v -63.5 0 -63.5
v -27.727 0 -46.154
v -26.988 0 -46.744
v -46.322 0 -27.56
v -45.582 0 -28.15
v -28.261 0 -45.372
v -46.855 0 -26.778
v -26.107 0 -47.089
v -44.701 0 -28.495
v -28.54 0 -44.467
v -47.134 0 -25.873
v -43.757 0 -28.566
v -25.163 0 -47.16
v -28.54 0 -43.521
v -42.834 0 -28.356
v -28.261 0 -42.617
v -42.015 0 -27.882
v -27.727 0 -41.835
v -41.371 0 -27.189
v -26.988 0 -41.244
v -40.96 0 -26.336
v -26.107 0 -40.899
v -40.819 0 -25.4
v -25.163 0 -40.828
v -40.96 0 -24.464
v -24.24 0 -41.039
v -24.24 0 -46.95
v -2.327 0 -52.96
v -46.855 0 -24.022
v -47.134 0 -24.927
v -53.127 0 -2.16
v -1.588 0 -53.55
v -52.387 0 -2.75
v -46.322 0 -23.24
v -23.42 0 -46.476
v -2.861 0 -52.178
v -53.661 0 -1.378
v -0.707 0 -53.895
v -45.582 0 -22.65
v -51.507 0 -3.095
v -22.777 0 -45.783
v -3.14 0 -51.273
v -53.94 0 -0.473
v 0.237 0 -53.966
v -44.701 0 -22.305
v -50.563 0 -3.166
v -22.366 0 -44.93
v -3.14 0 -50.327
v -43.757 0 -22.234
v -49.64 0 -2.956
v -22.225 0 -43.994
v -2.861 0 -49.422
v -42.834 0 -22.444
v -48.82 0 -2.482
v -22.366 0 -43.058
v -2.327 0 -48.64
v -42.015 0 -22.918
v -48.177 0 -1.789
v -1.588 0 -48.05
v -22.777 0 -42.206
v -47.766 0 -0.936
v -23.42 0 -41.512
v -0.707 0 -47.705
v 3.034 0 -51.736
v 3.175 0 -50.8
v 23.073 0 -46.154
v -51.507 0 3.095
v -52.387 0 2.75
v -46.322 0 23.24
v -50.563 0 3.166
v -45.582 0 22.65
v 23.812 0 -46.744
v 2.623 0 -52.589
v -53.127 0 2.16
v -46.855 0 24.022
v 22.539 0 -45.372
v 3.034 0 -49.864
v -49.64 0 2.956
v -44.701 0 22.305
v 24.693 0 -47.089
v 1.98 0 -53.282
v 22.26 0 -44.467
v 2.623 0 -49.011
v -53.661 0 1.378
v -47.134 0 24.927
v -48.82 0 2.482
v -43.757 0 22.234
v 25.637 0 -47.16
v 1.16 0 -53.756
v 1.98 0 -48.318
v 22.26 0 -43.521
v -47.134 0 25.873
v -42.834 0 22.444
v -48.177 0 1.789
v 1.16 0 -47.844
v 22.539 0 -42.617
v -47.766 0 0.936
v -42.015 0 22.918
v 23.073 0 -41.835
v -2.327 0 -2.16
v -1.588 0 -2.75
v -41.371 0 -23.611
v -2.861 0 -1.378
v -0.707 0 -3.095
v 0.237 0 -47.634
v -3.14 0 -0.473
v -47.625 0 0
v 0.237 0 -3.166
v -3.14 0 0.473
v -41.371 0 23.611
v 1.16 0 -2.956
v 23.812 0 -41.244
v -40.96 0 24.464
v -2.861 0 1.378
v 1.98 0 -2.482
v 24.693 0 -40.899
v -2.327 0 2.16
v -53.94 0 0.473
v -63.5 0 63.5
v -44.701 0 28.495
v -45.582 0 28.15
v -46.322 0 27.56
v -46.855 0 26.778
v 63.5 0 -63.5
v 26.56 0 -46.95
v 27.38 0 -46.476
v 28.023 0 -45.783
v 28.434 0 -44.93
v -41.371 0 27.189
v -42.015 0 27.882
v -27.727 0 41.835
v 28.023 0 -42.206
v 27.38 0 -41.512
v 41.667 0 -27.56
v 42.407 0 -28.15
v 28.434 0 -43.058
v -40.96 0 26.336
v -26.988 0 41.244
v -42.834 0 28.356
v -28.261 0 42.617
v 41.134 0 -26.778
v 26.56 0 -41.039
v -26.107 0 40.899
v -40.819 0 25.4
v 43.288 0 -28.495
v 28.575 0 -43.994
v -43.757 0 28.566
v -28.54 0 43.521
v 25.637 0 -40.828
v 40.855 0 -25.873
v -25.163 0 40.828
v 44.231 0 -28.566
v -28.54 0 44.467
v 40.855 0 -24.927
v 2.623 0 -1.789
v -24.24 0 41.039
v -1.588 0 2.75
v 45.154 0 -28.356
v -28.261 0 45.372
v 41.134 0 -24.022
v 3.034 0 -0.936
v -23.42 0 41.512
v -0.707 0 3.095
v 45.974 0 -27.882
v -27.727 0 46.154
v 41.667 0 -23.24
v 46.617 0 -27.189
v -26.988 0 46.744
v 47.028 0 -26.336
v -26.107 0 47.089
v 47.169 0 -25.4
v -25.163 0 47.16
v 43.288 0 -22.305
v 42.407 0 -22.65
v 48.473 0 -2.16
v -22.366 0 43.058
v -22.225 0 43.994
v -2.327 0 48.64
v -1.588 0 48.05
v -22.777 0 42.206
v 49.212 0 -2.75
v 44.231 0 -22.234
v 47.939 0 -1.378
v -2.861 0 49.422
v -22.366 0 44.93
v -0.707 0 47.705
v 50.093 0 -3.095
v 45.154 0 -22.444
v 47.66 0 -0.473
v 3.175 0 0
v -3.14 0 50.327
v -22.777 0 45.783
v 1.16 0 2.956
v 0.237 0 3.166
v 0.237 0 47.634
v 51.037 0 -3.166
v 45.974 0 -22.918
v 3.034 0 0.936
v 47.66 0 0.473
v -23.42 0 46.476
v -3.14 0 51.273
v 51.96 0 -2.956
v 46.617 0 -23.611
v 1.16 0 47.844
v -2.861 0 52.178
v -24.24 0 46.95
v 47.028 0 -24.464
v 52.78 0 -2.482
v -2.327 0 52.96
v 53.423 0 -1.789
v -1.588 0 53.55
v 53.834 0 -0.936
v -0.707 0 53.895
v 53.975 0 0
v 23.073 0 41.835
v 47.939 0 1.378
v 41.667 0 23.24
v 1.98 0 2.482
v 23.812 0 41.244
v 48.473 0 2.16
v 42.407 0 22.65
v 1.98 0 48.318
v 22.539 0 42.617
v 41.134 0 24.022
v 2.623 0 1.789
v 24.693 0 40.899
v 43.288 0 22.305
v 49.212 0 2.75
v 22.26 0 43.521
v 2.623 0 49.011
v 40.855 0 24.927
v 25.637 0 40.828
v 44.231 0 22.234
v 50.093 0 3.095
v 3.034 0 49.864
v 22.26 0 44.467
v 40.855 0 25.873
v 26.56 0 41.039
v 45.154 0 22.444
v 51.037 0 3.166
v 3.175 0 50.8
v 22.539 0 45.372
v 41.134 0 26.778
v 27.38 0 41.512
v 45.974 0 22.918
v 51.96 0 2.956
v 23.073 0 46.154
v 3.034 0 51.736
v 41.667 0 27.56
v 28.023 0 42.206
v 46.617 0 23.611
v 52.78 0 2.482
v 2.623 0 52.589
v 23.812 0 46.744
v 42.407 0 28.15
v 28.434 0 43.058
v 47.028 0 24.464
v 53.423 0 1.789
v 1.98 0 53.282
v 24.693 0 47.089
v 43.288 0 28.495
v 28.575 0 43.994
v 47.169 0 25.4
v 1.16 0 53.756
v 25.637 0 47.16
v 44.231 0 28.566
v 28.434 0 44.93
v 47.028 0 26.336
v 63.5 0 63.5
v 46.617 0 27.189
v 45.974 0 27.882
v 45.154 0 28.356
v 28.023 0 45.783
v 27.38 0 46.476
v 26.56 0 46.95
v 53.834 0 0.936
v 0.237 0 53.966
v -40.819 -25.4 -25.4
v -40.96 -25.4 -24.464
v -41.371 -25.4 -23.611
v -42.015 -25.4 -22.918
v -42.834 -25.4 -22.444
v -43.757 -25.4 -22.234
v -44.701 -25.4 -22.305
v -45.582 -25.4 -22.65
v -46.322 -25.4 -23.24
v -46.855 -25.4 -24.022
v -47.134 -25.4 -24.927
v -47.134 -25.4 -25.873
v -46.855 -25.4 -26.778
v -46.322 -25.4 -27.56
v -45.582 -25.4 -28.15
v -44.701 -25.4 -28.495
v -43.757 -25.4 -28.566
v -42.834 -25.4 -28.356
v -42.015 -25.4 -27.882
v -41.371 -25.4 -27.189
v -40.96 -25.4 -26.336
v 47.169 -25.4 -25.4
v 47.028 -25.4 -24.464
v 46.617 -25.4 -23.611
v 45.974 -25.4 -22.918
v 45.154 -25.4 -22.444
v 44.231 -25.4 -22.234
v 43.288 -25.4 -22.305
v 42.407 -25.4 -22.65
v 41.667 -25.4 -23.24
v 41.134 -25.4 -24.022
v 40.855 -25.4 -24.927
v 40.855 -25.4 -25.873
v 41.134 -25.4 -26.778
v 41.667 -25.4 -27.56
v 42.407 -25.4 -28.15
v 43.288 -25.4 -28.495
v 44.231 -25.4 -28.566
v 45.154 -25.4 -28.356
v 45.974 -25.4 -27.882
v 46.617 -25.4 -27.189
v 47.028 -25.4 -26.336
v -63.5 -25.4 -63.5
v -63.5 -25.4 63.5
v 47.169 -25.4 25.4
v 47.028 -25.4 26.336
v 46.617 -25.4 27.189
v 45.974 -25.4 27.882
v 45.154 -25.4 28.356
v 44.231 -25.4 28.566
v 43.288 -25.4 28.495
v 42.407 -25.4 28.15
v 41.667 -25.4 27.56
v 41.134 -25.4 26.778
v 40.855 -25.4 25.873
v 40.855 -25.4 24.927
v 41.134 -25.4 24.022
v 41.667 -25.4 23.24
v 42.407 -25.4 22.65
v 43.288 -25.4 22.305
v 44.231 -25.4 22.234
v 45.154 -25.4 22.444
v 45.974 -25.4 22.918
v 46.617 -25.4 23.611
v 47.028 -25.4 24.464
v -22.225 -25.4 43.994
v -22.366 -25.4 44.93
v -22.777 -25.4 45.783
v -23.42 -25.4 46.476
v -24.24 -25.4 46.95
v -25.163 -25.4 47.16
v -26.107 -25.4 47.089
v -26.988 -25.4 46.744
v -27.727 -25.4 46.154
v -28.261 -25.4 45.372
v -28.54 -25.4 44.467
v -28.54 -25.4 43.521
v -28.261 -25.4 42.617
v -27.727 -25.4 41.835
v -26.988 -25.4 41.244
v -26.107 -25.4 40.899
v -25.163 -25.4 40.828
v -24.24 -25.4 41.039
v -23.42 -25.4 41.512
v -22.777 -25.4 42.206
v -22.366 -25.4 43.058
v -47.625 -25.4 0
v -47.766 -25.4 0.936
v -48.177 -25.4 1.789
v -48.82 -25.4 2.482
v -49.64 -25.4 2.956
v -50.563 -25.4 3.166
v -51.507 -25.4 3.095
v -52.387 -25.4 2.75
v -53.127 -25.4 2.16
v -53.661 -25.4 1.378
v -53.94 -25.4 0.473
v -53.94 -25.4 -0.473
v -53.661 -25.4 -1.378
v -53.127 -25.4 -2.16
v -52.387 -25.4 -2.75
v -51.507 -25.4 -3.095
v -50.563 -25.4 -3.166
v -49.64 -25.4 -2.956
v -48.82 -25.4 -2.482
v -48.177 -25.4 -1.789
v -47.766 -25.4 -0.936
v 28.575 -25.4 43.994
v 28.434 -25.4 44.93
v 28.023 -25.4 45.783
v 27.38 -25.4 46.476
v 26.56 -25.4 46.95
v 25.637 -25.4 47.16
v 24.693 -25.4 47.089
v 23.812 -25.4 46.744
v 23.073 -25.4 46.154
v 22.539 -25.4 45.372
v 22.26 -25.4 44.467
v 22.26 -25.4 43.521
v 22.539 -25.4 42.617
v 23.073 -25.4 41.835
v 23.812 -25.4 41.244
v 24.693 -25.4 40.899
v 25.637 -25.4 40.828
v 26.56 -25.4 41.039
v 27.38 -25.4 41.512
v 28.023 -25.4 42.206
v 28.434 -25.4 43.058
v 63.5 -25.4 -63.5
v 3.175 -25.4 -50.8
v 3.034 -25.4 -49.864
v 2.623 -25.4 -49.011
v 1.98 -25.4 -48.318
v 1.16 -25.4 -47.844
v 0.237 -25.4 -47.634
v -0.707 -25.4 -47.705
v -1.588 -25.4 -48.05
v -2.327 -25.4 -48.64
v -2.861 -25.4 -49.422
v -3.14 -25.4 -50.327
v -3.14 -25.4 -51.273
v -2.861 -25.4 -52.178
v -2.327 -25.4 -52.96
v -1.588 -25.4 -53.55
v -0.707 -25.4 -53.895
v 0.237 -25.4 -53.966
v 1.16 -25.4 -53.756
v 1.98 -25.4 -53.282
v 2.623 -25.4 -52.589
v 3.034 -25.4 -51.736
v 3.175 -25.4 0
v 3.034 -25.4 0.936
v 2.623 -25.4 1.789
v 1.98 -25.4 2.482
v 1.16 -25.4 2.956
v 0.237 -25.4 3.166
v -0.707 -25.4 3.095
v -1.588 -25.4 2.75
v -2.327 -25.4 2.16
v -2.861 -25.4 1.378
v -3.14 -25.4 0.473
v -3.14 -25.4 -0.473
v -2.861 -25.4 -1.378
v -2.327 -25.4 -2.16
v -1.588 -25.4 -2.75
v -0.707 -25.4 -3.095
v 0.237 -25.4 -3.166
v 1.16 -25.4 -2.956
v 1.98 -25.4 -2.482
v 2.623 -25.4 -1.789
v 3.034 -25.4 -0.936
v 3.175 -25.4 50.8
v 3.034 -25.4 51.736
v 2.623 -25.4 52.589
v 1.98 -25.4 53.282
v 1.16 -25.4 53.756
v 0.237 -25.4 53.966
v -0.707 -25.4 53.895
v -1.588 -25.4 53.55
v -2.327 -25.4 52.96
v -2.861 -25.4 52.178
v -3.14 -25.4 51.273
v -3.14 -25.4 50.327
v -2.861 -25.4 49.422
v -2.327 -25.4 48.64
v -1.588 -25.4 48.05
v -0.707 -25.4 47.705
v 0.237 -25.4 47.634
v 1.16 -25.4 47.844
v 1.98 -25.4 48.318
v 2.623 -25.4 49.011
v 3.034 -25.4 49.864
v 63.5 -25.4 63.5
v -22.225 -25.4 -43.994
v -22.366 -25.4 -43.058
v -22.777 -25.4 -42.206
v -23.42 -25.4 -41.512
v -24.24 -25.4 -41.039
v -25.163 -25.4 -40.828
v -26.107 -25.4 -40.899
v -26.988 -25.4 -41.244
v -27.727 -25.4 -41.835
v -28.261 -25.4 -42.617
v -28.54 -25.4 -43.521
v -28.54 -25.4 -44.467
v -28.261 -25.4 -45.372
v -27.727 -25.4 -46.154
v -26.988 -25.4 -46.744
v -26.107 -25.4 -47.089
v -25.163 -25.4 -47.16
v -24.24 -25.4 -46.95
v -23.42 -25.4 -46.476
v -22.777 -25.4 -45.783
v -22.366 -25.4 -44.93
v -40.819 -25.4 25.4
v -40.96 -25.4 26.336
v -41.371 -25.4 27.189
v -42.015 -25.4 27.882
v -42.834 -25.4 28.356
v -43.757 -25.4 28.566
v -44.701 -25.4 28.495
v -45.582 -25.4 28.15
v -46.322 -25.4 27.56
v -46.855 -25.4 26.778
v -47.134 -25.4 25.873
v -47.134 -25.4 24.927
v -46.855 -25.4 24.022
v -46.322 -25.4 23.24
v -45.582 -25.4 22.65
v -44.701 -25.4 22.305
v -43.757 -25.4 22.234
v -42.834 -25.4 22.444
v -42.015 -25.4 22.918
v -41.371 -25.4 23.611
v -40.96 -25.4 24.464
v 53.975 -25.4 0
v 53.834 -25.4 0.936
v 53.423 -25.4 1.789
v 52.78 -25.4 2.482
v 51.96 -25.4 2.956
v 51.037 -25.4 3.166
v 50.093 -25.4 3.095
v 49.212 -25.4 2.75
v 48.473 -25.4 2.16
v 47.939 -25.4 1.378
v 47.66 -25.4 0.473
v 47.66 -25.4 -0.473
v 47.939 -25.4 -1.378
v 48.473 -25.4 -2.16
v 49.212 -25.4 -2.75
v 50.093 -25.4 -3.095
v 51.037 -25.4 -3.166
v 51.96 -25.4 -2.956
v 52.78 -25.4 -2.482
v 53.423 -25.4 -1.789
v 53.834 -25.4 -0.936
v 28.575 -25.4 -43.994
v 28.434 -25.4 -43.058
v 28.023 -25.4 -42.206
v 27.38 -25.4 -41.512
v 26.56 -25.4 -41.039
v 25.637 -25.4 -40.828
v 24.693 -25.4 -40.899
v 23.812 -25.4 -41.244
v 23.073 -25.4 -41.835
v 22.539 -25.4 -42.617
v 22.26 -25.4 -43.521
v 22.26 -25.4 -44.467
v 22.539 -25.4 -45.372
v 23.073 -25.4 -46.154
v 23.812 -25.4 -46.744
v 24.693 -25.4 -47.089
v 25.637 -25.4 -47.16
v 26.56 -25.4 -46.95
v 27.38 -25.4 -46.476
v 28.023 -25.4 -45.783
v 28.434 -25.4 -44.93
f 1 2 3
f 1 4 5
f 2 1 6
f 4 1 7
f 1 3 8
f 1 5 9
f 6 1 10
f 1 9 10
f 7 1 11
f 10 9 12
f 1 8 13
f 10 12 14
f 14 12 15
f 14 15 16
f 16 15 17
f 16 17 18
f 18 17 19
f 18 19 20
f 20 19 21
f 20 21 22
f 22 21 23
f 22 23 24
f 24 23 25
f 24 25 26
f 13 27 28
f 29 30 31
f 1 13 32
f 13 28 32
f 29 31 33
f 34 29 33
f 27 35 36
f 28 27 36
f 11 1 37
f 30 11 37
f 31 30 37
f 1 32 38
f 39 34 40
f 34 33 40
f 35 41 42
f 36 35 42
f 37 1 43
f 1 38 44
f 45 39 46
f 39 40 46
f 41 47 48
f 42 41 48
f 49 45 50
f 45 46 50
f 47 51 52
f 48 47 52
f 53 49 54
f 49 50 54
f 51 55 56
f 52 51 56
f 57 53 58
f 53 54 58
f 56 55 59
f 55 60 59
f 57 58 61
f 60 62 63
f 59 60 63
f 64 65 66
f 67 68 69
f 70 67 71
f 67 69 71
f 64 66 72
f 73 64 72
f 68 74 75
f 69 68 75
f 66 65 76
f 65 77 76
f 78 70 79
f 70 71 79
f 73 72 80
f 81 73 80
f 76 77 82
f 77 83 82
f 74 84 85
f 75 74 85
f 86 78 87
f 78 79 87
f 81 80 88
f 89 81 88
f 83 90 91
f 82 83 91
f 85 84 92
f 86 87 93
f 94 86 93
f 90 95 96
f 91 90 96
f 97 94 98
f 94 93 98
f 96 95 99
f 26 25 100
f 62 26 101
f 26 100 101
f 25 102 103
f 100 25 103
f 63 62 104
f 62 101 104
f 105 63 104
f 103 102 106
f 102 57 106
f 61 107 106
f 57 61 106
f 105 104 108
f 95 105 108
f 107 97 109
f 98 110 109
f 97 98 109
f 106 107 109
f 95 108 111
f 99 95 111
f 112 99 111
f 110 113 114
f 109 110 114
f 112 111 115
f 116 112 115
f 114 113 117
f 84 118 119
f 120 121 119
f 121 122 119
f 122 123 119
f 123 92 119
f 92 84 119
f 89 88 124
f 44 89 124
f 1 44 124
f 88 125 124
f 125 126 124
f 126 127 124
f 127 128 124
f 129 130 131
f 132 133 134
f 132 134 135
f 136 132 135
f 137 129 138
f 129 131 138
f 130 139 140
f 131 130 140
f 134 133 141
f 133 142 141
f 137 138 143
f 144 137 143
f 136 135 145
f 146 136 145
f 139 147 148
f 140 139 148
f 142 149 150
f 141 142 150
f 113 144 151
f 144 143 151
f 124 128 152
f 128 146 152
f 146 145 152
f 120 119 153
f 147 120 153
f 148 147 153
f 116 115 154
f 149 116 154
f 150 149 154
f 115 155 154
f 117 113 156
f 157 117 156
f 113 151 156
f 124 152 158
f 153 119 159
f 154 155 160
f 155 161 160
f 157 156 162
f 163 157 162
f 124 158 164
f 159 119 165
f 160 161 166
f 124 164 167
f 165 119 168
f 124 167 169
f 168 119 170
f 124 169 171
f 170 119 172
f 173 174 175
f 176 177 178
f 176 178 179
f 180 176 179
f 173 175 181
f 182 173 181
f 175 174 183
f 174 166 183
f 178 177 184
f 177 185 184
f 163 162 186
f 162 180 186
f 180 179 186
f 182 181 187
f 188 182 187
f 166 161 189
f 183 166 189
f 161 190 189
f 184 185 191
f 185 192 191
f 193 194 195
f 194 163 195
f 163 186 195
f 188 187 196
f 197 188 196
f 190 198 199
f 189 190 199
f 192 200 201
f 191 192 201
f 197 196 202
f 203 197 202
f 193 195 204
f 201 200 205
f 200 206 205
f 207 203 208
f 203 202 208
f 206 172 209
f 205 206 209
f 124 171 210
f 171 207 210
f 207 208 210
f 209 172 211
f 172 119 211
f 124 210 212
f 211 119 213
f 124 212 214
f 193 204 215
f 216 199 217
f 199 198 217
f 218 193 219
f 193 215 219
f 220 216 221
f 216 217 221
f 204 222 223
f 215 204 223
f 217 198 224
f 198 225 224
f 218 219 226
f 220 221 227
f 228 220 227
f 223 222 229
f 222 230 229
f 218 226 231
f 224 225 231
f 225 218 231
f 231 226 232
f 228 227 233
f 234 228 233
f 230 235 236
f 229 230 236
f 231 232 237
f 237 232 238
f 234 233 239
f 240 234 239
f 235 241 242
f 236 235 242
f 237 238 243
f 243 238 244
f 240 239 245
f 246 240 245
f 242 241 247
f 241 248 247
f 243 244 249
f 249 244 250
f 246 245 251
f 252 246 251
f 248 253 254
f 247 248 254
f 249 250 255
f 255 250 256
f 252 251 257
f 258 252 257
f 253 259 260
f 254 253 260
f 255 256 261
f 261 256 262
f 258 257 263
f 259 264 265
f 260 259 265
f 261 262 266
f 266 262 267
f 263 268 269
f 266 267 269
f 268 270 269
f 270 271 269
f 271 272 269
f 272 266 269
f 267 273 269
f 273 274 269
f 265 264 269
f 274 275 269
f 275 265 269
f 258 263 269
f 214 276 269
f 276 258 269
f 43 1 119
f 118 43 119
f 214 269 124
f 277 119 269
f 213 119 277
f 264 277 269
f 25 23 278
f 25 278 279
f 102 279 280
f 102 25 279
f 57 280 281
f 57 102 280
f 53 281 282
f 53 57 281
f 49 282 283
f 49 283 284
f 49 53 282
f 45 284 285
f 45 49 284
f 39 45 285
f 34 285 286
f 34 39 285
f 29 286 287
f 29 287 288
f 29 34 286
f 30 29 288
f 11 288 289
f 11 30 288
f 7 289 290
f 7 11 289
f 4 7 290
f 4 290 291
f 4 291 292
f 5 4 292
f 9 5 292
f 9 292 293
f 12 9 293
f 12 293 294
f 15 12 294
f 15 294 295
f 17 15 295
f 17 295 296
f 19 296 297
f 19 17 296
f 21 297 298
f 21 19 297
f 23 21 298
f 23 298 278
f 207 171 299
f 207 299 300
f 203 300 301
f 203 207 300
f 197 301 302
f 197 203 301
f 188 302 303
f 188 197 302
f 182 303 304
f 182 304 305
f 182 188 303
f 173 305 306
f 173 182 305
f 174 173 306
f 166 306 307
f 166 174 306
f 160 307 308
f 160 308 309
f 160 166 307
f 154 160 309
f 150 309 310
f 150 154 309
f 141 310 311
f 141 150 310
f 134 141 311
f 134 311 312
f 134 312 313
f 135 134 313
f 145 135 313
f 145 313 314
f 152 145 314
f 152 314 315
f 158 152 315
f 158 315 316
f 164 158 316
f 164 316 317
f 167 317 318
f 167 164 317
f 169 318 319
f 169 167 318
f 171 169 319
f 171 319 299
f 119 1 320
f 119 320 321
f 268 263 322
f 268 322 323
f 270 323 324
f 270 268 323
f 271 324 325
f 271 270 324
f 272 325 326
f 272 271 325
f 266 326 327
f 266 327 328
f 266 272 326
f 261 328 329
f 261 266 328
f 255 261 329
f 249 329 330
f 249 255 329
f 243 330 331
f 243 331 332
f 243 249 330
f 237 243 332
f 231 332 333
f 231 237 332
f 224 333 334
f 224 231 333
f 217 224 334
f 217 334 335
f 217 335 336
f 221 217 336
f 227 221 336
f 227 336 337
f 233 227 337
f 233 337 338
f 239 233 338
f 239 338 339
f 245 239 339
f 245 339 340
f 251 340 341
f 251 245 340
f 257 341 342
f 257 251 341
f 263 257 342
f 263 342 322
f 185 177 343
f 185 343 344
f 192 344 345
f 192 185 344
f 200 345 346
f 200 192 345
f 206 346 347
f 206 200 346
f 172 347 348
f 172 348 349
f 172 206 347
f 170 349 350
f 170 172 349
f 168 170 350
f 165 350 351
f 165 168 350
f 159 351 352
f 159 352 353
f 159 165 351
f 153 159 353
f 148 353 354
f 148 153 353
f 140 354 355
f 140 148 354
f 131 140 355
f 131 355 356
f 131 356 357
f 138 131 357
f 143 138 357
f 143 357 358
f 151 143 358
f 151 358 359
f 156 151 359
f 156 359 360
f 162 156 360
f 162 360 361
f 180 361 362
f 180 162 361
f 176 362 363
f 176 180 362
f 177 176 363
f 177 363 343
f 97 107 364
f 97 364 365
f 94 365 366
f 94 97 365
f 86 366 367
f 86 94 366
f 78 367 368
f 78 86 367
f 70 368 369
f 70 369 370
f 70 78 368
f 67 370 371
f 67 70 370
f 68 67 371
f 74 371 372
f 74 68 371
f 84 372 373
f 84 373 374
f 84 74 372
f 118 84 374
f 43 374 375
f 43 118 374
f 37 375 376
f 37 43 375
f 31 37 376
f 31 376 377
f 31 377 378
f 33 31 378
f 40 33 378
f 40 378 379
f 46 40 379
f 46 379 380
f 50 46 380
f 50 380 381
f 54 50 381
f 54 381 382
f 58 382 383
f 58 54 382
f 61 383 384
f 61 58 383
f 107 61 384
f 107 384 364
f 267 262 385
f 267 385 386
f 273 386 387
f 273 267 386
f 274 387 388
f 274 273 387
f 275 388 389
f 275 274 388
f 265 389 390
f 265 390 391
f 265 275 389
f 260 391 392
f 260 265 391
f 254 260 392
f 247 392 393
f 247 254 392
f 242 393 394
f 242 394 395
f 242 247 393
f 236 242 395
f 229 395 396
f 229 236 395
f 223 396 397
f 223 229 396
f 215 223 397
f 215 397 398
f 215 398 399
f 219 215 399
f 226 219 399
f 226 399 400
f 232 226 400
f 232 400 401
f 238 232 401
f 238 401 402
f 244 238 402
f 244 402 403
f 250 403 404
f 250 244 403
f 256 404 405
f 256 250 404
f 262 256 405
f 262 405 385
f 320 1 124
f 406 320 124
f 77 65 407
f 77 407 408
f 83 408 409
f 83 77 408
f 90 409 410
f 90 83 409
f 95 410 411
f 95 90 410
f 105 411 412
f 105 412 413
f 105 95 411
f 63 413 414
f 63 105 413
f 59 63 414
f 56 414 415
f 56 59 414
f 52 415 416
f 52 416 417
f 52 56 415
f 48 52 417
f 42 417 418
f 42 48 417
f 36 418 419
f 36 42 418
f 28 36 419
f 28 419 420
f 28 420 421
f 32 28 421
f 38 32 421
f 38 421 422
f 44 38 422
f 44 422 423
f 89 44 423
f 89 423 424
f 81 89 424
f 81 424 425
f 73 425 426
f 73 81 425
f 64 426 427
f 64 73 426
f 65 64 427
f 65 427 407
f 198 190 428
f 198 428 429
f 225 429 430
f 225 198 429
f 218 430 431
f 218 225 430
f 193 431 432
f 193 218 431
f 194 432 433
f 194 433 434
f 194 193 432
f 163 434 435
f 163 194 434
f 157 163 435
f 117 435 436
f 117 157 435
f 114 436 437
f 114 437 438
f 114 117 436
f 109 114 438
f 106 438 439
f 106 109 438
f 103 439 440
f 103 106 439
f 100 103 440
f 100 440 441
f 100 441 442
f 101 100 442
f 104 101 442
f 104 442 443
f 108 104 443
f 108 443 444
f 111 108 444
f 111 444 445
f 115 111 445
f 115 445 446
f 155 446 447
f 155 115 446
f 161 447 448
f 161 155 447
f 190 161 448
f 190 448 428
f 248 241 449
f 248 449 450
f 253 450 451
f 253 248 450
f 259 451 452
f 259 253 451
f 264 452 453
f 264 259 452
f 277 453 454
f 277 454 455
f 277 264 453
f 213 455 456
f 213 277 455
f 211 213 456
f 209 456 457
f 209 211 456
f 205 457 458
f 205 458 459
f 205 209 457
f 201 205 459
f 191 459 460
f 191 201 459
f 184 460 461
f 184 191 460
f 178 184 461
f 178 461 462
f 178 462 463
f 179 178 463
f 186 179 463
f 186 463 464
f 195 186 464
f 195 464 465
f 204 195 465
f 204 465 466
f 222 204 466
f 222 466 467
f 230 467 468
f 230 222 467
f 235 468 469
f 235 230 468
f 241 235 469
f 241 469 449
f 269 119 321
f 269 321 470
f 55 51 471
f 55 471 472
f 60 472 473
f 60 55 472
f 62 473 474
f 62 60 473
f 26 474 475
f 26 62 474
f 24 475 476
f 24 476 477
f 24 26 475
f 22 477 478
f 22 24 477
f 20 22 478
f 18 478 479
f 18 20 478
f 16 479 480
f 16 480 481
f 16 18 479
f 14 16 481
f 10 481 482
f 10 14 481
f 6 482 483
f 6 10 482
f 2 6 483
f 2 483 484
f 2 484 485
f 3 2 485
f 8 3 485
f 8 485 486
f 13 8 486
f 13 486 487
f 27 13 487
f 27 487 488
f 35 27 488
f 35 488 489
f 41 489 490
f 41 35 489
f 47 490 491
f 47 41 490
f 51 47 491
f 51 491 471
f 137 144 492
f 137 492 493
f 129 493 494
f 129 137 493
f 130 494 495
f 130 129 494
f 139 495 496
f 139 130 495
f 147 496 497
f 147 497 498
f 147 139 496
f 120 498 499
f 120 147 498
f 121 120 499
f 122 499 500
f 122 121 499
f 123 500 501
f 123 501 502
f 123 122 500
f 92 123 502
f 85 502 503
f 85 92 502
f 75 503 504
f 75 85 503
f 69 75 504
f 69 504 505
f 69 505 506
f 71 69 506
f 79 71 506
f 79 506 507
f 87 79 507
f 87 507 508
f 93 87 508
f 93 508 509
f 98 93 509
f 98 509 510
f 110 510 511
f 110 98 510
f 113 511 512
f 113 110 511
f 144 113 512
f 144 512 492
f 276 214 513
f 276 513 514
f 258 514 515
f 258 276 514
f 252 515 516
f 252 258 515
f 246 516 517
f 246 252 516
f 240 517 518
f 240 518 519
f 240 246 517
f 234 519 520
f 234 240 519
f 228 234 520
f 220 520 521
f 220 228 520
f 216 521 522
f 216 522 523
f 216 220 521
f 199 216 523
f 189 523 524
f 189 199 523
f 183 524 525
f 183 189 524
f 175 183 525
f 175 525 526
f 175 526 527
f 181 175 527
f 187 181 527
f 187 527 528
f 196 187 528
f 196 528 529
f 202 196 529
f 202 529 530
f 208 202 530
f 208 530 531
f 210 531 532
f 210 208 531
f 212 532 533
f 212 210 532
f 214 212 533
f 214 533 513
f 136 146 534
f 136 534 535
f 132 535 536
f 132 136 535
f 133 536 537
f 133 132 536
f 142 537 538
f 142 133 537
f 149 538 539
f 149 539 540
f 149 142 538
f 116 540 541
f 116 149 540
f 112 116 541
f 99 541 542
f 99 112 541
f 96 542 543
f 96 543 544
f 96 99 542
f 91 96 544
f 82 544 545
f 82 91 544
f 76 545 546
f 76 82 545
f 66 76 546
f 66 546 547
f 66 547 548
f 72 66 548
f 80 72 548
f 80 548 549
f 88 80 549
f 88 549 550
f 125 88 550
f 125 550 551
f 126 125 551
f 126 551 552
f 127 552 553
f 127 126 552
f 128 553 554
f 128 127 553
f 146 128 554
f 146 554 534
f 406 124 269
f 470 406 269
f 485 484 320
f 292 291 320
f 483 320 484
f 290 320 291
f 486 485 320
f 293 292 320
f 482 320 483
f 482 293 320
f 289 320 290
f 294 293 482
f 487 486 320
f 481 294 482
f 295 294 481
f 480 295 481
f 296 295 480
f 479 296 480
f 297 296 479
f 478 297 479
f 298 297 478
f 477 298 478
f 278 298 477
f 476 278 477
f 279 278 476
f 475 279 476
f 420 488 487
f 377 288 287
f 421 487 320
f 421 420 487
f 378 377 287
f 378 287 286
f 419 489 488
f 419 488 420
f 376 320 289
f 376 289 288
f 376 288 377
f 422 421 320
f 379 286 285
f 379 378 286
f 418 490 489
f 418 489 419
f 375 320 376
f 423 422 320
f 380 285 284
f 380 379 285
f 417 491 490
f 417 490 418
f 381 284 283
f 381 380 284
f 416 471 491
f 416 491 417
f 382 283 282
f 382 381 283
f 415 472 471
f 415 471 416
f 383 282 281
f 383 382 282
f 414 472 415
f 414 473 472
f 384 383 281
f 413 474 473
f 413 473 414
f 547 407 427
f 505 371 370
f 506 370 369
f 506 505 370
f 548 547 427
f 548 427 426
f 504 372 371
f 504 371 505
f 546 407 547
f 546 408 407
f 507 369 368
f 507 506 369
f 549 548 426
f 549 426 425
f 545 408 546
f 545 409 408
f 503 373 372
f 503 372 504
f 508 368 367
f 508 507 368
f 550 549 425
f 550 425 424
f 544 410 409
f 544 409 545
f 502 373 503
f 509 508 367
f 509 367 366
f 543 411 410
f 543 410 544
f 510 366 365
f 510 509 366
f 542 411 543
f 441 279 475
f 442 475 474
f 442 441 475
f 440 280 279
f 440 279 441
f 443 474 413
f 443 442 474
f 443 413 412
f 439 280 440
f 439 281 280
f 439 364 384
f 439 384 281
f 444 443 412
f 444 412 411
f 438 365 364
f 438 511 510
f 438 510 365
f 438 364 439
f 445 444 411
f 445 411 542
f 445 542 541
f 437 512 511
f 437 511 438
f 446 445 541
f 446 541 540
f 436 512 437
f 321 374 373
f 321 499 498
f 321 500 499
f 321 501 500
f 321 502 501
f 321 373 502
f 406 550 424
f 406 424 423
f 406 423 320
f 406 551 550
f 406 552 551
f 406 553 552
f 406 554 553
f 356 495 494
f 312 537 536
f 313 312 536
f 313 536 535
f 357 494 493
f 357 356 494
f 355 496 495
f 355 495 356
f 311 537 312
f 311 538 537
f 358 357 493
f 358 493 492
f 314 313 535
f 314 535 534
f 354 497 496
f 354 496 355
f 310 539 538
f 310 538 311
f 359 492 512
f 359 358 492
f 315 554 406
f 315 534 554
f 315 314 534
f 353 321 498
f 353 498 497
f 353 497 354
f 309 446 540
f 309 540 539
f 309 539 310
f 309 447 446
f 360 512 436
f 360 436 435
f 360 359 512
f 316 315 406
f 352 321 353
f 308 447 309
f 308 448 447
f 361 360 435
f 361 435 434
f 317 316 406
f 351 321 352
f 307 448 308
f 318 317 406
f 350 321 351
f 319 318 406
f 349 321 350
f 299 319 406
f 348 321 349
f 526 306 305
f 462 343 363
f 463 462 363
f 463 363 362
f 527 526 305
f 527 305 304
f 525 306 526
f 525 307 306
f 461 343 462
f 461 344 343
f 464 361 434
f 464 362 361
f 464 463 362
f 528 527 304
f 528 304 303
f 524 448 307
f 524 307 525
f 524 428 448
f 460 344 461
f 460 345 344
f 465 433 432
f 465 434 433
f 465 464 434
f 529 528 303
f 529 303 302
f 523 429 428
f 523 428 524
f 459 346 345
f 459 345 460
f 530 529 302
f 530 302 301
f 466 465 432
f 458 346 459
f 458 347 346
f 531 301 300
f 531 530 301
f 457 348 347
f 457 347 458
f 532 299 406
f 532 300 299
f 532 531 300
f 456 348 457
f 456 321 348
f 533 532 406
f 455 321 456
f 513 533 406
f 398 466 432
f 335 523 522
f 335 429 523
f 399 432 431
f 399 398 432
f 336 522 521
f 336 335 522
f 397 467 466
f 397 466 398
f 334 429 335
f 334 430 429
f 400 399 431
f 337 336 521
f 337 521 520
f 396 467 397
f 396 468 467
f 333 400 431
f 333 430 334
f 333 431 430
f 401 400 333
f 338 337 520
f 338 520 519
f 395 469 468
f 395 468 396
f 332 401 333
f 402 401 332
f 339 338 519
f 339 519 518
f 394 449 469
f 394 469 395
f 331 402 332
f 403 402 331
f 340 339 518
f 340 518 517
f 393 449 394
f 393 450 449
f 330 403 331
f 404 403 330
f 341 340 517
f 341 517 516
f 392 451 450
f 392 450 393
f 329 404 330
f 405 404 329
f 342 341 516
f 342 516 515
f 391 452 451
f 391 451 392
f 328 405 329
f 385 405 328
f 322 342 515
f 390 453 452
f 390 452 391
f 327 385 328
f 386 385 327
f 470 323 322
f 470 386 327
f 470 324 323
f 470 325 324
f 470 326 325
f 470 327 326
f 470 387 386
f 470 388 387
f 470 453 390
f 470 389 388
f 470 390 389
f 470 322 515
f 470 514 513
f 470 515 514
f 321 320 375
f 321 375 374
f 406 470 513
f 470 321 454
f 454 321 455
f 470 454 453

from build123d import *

# Parameters (mm, degrees)
F0_W     = 127
F0_H     = 127
F0_R     = 3.175
F1_DEPTH = 25.4


with BuildPart() as f1:
    # F0 (on Front) → F1 (new body)
    with BuildSketch(Plane.XZ):
        Rectangle(F0_W, F0_H)
        with Locations((-25.4, -43.994091)):
            Circle(F0_R, mode=Mode.SUBTRACT)
        with Locations((-43.994091, -25.4)):
            Circle(F0_R, mode=Mode.SUBTRACT)
        with Locations((0, -50.8)):
            Circle(F0_R, mode=Mode.SUBTRACT)
        with Locations((25.4, -43.994091)):
            Circle(F0_R, mode=Mode.SUBTRACT)
        with Locations((43.994091, -25.4)):
            Circle(F0_R, mode=Mode.SUBTRACT)
        with Locations((-50.8, 0)):
            Circle(F0_R, mode=Mode.SUBTRACT)
        with Locations((-43.994091, 25.4)):
            Circle(F0_R, mode=Mode.SUBTRACT)
        with Locations((-25.4, 43.994091)):
            Circle(F0_R, mode=Mode.SUBTRACT)
        Circle(F0_R, mode=Mode.SUBTRACT)
        with Locations((50.8, 0)):
            Circle(F0_R, mode=Mode.SUBTRACT)
        with Locations((43.994091, 25.4)):
            Circle(F0_R, mode=Mode.SUBTRACT)
        with Locations((25.4, 43.994091)):
            Circle(F0_R, mode=Mode.SUBTRACT)
        with Locations((0, 50.8)):
            Circle(F0_R, mode=Mode.SUBTRACT)
    extrude(amount=F1_DEPTH)


solid = f1.part
